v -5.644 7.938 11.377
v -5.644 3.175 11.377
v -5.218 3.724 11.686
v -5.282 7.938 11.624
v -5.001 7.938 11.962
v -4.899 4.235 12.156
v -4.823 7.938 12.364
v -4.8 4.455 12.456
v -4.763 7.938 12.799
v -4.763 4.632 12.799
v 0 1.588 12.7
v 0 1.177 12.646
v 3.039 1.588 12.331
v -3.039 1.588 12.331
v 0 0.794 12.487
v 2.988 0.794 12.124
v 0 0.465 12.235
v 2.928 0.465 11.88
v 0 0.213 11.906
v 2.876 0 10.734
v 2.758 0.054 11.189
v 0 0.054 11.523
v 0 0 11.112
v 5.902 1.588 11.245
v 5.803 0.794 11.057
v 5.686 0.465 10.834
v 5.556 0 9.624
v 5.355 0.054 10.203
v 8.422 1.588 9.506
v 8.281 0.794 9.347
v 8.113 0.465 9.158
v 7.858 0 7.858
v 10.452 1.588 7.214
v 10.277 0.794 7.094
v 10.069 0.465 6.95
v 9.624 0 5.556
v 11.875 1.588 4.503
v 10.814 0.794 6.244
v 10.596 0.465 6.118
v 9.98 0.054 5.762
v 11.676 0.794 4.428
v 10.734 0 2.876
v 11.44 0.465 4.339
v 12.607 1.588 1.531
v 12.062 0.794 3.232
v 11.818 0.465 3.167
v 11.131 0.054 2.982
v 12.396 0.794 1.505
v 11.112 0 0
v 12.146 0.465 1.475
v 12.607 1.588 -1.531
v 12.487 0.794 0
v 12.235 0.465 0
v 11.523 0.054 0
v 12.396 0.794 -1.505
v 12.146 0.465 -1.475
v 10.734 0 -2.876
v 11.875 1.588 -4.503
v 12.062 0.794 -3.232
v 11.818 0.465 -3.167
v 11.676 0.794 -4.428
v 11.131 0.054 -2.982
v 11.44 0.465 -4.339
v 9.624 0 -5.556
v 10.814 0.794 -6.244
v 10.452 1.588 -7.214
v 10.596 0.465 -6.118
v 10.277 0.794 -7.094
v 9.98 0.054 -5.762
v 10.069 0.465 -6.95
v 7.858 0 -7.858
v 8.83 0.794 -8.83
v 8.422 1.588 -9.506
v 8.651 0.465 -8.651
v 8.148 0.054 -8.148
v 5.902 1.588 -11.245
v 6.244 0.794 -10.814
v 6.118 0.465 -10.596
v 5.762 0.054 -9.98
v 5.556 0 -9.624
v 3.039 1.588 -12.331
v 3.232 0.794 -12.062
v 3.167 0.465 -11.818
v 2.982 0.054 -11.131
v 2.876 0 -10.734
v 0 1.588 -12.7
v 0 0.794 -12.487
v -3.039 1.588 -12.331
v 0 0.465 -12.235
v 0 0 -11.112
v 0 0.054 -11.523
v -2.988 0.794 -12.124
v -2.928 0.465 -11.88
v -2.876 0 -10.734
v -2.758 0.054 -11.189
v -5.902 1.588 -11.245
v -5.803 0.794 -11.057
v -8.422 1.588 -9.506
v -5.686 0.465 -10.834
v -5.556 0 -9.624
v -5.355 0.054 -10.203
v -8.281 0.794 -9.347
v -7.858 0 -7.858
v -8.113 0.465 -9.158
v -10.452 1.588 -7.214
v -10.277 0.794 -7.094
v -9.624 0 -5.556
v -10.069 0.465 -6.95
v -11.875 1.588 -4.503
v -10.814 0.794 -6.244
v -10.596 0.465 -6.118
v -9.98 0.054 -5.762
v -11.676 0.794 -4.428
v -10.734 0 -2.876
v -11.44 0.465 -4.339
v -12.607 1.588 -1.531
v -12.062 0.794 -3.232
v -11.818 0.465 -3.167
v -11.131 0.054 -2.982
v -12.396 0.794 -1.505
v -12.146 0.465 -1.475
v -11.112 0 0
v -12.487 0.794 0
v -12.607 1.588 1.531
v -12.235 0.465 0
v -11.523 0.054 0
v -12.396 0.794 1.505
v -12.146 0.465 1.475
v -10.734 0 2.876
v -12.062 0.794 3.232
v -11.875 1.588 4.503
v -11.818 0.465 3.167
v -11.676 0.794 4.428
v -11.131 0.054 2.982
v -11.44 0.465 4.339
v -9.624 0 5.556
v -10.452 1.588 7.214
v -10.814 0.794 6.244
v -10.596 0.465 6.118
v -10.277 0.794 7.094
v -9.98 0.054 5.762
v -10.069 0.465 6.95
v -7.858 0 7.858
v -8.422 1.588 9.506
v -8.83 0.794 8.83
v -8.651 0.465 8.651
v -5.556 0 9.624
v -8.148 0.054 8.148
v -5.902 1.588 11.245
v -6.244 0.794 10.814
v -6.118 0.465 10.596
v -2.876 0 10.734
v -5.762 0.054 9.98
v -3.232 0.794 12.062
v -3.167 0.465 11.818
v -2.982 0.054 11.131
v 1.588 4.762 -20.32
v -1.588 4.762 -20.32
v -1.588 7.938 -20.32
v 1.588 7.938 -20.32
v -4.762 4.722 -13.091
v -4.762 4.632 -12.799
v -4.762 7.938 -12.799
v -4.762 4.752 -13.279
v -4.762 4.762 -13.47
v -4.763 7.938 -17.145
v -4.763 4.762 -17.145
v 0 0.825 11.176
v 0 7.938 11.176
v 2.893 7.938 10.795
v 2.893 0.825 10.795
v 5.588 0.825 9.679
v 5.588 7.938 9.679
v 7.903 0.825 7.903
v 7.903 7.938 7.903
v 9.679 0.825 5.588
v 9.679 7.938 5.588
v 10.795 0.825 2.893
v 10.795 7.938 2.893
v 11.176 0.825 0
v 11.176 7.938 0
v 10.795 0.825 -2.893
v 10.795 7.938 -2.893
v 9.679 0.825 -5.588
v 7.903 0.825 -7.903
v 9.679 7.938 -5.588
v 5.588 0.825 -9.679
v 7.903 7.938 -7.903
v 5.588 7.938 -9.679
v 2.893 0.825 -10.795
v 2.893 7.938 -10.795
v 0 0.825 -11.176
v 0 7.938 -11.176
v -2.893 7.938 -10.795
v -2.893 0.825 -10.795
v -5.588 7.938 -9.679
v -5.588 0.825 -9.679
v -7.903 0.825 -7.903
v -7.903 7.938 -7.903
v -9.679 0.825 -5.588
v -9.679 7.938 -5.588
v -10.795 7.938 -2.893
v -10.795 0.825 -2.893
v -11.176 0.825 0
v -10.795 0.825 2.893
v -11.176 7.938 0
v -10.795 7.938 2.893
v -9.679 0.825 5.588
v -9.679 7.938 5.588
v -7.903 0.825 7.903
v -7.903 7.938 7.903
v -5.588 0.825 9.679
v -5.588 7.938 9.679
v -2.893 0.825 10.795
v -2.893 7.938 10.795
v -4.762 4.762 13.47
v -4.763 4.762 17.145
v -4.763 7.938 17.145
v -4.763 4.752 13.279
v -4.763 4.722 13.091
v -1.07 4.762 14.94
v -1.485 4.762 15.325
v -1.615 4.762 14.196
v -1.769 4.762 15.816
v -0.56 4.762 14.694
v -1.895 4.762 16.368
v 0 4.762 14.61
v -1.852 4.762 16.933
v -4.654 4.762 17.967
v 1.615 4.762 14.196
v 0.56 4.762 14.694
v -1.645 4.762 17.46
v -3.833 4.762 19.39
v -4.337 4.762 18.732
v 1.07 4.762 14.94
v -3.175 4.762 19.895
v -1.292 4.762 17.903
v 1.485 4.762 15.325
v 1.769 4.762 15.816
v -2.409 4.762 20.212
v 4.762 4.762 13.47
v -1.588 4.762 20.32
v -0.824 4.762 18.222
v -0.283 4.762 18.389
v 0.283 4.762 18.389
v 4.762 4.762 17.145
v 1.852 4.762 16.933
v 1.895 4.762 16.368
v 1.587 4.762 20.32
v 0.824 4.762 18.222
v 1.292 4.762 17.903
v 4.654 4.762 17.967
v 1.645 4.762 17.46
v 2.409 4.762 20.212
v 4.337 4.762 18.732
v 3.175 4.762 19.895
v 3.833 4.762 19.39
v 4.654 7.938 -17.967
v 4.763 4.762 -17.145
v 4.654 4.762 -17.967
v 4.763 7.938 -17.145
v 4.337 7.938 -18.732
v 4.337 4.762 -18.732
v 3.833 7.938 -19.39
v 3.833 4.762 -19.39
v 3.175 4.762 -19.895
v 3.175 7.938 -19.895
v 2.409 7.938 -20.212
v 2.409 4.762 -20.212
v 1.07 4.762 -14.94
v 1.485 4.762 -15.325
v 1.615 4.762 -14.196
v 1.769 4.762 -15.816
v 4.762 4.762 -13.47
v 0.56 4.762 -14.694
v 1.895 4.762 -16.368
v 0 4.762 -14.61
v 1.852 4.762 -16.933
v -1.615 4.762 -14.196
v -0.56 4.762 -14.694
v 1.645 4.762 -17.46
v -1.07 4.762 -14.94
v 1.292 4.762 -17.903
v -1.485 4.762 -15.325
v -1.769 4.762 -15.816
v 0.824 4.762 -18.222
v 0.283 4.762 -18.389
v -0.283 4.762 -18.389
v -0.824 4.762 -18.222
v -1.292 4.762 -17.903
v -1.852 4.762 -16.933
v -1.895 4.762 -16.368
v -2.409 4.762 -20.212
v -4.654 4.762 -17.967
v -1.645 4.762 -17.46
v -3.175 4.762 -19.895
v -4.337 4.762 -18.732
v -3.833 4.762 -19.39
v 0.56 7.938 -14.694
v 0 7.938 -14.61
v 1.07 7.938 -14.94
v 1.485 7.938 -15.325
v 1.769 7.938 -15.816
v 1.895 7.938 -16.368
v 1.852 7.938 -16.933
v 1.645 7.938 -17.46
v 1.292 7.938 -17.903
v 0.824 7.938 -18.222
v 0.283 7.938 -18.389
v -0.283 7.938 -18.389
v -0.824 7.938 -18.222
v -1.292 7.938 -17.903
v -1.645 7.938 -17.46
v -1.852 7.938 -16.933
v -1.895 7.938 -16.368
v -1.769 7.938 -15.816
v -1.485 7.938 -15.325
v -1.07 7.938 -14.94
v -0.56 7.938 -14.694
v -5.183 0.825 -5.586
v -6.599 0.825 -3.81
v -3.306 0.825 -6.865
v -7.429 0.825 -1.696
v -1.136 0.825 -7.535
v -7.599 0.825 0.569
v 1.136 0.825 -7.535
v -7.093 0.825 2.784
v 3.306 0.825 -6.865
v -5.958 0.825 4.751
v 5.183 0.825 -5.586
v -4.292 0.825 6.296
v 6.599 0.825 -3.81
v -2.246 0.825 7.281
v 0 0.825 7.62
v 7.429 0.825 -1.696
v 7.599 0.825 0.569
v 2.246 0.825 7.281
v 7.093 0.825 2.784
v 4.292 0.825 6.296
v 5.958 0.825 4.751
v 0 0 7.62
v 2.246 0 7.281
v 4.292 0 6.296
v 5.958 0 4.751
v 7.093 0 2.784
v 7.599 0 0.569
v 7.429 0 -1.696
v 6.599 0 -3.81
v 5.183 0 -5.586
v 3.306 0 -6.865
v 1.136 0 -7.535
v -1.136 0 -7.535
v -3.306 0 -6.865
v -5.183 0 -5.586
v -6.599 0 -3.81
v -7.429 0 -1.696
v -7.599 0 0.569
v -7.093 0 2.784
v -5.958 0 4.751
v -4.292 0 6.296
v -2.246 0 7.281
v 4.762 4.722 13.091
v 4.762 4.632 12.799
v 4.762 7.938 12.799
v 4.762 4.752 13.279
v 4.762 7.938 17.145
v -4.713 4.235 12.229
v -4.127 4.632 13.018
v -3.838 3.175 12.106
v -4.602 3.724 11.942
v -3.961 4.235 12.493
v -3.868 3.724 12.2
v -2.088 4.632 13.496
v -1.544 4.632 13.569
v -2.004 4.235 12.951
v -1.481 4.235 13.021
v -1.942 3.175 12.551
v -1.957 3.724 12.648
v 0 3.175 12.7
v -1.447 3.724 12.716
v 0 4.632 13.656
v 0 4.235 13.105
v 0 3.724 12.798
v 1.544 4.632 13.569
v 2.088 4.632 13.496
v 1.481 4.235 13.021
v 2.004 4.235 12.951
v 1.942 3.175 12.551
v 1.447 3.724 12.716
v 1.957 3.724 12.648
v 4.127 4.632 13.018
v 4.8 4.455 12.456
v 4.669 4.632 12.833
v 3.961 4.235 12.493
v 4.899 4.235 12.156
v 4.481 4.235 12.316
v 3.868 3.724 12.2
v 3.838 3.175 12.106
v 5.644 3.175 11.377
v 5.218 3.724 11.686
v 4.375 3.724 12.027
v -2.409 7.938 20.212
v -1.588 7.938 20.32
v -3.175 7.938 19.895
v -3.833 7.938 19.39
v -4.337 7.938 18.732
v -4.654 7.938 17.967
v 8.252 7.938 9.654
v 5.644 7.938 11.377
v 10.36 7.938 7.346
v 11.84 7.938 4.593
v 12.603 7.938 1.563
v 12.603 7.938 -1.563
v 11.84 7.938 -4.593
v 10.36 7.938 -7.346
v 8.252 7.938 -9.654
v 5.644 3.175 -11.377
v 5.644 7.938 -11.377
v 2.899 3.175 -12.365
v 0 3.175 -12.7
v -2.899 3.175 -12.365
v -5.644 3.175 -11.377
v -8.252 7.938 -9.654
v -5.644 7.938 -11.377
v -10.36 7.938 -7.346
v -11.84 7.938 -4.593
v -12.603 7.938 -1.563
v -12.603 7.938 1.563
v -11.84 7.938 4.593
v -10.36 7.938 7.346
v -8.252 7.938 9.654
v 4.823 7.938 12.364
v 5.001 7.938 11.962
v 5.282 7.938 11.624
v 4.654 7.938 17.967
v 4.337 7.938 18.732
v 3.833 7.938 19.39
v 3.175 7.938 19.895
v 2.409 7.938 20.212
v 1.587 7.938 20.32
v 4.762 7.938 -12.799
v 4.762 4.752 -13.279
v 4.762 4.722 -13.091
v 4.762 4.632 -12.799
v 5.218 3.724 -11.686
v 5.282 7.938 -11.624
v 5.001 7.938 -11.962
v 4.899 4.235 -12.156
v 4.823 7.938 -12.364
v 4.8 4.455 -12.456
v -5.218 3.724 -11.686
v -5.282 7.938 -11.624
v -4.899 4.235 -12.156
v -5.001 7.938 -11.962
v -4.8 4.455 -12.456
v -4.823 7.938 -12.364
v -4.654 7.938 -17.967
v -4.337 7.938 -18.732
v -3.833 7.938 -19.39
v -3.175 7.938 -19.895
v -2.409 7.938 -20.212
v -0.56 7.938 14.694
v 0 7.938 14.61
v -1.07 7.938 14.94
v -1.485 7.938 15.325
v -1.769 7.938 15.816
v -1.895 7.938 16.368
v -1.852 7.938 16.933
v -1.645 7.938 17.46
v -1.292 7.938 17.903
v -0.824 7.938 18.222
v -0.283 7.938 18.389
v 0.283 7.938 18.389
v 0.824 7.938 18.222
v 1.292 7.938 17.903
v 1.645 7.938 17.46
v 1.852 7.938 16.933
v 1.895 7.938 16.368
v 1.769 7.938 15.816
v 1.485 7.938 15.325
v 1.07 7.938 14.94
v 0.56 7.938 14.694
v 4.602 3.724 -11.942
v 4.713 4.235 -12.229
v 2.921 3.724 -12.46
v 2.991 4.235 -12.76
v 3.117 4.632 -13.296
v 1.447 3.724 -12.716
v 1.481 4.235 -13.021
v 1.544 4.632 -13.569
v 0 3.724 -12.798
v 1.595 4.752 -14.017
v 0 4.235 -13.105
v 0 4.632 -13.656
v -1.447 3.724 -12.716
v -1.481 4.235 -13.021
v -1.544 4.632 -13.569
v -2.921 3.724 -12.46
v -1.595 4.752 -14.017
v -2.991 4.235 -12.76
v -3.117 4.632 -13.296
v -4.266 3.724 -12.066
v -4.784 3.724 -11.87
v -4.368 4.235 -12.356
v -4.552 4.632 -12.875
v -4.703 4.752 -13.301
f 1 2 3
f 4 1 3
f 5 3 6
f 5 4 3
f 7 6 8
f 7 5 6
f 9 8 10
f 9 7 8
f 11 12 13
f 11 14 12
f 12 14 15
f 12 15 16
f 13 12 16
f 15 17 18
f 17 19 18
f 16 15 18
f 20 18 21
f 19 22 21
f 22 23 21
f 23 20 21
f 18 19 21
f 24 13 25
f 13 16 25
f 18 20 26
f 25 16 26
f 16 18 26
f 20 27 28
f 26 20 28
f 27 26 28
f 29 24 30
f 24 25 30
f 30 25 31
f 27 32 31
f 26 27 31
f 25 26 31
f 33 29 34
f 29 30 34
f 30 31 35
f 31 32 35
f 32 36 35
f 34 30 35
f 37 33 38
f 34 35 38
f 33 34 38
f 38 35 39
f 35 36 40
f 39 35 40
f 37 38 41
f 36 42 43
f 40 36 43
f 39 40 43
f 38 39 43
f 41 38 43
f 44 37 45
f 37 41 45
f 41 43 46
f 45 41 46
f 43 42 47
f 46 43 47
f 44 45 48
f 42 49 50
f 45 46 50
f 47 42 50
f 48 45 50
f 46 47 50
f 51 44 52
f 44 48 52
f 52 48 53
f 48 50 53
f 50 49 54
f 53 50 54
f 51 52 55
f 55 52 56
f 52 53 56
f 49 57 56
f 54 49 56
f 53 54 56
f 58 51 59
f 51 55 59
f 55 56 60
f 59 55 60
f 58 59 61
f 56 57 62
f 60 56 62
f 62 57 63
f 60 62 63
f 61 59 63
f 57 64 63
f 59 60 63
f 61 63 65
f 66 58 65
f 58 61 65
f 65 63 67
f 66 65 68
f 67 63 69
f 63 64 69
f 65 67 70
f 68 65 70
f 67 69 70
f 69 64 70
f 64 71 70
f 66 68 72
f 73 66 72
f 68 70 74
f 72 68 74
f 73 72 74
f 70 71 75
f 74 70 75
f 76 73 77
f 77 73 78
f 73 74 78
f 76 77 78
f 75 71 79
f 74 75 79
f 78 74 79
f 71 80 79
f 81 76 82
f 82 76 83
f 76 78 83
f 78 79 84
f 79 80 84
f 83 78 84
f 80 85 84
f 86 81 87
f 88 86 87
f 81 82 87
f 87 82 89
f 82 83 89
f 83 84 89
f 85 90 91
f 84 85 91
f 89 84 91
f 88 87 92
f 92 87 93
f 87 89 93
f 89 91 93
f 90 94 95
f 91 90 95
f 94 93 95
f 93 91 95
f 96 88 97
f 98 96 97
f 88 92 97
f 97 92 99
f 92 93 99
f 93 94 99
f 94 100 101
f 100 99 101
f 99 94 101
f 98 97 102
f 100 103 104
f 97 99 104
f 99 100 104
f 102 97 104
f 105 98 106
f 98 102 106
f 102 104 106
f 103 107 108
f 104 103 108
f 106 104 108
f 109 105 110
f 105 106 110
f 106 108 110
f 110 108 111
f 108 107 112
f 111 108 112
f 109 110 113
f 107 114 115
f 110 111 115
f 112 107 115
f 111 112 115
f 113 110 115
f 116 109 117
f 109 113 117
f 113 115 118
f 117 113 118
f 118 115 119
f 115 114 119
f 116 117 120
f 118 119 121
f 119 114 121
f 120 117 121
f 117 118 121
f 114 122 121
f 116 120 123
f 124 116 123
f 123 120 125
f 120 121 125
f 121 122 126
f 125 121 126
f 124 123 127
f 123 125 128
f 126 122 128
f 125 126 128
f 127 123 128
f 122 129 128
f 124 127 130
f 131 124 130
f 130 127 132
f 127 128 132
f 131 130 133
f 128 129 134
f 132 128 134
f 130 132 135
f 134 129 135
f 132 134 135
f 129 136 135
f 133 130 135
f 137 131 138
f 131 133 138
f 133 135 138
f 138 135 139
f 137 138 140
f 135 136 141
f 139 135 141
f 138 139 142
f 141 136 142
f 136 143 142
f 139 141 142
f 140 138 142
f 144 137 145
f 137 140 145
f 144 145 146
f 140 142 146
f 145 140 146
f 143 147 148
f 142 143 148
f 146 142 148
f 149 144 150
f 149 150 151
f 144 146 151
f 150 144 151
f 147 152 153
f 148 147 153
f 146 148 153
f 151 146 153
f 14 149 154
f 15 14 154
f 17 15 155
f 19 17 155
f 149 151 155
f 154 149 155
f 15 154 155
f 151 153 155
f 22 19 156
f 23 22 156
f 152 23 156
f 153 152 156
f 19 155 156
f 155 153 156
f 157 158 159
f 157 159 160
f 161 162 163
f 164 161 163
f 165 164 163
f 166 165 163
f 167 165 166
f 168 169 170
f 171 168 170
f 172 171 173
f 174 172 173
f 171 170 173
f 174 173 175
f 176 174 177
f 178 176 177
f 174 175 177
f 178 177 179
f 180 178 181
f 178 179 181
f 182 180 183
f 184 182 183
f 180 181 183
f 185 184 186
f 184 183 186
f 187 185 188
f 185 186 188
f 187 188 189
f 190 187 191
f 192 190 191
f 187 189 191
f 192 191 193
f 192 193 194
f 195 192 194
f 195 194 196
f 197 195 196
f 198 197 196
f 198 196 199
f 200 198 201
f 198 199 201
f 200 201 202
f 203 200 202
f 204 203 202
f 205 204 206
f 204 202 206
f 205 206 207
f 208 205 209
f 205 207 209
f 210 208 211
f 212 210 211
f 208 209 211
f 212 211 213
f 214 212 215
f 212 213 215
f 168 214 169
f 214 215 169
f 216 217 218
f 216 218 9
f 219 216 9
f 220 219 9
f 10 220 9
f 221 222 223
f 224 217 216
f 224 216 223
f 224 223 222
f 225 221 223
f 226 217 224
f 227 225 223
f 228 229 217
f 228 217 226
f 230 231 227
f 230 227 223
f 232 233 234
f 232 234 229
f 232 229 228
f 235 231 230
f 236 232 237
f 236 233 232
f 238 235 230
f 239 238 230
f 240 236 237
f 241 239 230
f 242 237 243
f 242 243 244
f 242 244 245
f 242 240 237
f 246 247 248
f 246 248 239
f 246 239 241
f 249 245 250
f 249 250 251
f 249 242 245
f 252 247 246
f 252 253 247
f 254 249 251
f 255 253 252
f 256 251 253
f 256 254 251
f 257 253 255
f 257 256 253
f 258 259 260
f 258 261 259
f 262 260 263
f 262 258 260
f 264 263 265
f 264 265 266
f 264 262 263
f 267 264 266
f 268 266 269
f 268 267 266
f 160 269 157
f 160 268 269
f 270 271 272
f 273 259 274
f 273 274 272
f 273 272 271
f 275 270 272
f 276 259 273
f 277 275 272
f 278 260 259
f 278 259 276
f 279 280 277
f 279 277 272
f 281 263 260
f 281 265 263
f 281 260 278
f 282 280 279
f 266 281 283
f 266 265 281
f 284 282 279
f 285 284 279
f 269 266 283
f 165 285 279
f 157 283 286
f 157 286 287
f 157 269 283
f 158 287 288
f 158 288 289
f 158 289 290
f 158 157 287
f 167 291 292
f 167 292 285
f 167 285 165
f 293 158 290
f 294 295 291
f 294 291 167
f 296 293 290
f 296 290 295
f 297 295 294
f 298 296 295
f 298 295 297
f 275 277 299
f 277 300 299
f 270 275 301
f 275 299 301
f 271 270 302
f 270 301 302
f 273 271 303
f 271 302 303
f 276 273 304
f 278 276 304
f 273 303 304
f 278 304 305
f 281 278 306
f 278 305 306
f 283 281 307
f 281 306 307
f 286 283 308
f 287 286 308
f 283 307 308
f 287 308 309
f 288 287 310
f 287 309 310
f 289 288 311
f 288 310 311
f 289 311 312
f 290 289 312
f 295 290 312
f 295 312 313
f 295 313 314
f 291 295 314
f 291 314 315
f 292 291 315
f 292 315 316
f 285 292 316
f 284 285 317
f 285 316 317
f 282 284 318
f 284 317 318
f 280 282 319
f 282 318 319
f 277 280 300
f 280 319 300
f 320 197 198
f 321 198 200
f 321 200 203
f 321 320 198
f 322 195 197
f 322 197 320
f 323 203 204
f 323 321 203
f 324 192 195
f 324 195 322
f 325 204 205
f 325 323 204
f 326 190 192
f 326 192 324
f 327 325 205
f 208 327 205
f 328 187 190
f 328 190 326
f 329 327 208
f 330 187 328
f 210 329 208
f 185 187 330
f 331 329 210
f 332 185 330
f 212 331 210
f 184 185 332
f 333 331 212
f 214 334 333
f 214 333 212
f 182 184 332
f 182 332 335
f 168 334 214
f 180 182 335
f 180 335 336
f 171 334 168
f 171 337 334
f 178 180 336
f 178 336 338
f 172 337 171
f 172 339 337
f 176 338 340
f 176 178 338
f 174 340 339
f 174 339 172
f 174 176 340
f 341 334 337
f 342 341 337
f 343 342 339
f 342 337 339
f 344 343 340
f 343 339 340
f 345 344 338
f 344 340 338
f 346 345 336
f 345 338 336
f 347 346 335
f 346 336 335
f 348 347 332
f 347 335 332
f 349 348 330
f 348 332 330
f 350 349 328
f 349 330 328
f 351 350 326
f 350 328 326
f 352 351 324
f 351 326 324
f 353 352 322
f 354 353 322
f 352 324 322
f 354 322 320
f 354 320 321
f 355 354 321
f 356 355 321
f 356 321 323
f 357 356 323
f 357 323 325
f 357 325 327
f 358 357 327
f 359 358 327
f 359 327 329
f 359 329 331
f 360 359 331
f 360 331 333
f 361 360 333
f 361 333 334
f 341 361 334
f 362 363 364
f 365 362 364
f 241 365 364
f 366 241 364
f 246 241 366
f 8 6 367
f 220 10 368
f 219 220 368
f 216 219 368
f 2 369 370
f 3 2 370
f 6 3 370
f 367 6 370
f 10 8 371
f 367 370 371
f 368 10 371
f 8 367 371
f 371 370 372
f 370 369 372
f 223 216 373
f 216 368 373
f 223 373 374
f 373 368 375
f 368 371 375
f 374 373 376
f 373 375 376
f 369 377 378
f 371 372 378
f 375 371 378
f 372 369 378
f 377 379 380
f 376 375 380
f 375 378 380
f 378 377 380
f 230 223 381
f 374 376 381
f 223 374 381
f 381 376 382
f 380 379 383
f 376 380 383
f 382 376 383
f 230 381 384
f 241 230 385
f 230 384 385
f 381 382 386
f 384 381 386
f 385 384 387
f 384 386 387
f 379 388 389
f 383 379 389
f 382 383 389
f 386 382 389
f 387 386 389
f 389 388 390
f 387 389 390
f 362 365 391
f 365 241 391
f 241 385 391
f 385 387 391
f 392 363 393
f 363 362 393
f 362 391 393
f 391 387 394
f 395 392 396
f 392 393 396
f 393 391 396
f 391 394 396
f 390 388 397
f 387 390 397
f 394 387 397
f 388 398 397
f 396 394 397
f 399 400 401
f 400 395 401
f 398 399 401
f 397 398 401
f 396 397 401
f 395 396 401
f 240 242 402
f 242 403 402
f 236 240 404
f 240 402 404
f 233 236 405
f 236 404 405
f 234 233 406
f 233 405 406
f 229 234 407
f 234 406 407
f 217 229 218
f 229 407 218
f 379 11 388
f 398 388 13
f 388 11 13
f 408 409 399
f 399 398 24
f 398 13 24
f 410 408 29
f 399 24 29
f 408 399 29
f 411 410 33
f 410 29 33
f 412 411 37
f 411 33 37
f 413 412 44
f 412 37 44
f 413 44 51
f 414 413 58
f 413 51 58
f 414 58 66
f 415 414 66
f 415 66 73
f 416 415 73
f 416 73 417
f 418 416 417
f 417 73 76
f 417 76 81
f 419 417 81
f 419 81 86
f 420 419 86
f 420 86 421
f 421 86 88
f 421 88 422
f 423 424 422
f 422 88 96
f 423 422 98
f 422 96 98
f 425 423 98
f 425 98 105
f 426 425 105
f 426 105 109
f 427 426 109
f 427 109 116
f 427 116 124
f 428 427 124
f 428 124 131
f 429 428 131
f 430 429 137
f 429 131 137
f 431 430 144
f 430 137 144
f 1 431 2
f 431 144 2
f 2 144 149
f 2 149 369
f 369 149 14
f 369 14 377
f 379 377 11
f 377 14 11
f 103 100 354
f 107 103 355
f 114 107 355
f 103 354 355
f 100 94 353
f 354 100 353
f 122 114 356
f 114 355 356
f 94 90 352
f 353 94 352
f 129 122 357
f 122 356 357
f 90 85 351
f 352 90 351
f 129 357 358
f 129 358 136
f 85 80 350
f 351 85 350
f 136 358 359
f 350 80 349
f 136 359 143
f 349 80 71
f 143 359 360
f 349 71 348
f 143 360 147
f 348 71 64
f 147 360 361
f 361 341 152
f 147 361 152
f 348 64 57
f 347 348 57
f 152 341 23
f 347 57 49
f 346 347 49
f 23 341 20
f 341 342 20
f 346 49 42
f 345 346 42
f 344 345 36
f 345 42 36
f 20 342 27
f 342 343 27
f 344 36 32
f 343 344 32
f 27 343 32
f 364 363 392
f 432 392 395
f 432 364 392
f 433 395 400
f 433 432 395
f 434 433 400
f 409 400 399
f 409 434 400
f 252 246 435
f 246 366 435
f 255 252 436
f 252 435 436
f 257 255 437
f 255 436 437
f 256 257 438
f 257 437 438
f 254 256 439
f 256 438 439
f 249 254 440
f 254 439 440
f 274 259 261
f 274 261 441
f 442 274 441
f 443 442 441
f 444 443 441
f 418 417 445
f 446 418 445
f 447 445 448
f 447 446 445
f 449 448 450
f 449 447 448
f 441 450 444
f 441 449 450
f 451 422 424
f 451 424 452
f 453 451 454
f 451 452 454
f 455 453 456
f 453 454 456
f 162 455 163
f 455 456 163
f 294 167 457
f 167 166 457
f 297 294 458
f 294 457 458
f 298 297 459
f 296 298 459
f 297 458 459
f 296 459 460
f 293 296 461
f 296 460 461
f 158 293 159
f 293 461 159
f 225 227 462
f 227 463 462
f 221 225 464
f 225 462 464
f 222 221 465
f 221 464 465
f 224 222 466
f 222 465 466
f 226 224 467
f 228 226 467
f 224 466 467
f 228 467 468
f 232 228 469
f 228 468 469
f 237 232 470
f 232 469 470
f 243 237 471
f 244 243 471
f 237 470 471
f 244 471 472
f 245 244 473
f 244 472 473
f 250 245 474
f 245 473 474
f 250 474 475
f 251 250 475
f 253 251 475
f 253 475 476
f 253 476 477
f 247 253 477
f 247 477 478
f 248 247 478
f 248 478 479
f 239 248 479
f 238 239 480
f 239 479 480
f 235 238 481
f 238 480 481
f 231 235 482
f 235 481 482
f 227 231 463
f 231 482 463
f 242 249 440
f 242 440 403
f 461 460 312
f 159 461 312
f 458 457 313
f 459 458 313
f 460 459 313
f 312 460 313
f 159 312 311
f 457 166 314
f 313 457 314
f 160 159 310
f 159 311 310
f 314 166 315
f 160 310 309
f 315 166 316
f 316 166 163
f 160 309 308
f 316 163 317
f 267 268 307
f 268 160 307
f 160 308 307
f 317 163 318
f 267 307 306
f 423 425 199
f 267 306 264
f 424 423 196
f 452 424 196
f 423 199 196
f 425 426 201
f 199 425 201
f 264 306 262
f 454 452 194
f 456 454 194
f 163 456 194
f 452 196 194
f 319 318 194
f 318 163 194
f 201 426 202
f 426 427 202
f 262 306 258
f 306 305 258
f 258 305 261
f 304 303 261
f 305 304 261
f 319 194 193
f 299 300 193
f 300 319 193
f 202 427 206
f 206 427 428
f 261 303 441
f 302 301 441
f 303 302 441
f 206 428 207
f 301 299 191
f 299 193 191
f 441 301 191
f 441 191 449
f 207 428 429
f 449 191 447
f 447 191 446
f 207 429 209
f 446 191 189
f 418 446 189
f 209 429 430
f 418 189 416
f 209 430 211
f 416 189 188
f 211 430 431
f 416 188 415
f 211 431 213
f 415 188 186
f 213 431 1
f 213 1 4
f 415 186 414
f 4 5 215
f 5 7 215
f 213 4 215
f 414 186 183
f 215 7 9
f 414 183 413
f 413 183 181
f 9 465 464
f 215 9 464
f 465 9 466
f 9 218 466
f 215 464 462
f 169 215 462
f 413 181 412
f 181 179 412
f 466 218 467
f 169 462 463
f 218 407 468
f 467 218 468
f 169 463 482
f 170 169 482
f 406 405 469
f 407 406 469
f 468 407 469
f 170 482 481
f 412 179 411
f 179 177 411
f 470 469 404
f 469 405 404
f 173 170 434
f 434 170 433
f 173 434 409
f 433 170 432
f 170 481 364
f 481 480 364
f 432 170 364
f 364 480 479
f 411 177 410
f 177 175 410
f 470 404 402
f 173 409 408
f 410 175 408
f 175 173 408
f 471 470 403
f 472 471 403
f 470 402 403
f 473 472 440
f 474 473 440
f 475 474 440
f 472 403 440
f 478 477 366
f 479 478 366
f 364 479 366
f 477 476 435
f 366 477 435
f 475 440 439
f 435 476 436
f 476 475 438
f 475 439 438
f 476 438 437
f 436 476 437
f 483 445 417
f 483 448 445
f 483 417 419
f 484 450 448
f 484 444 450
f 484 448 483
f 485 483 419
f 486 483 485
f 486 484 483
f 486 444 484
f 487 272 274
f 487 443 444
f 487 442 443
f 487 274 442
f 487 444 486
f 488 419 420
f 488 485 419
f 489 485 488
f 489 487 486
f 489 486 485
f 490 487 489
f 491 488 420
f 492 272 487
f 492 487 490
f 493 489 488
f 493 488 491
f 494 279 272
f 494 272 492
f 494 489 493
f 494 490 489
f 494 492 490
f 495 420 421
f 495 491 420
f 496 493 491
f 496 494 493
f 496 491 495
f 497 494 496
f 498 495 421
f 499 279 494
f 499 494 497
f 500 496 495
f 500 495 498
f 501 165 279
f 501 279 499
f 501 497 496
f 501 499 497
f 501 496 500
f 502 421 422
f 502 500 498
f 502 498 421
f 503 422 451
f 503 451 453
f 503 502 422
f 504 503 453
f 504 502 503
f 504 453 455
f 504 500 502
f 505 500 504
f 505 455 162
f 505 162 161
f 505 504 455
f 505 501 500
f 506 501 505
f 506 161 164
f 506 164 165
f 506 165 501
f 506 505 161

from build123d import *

# Parameters (mm, degrees)
SKETCH1_R                = 12.7
BOSS_EXTRUDE1_DEPTH      = 7.9375
SKETCH3_R                = 7.62
CUT_EXTRUDE2_DEPTH       = 20.636290542
SKETCH4_R                = 11.176
CUT_EXTRUDE3_DEPTH       = 7.112
BOSS_EXTRUDE2_START      = -3.175
BOSS_EXTRUDE2_DEPTH      = 3.175
SKETCH6_R                = 1.9
CUT_EXTRUDE4_DEPTH       = 26.242747597
FILLET1_R                = 3.175
CIRPATTERN1_COUNT        = 2
FILLET1_OF_CIRPATTERN1_R = 3.175
FILLET2_R                = 1.5875


with BuildPart() as part:
    # Sketch1 → Boss-Extrude1 (new body)
    with BuildSketch(Plane(origin=(0, 0, 0), x_dir=(1, 0, 0), z_dir=(0, 1, 0))):
        with Locations(Location((0, 0, 0), (0, 0, 270))):
            Circle(SKETCH1_R)
    extrude(amount=BOSS_EXTRUDE1_DEPTH)

    # Sketch3 → Cut-Extrude2 (cut, through all)
    with BuildSketch(Plane(origin=(0, 7.9375, 0), x_dir=(1, 0, 0), z_dir=(0, 1, 0))):
        with Locations(Location((0, 0, 0), (0, 0, 270))):
            Circle(SKETCH3_R)
    extrude(amount=-CUT_EXTRUDE2_DEPTH, mode=Mode.SUBTRACT)

    # Sketch4 → Cut-Extrude3 (cut)
    with BuildSketch(Plane(origin=(0, 7.9375, 0), x_dir=(1, 0, 0), z_dir=(0, 1, 0))):
        with Locations(Location((0, 0, 0), (0, 0, 270))):
            Circle(SKETCH4_R)
    extrude(amount=-CUT_EXTRUDE3_DEPTH, mode=Mode.SUBTRACT)

    # Sketch5 → Boss-Extrude2 (add)
    with BuildSketch(Plane(origin=(0, 7.9375, 0), x_dir=(1, 0, 0), z_dir=(0, 1, 0)).offset(BOSS_EXTRUDE2_START)):
        with BuildLine():
            Line((-4.7625, 11.773215098), (-4.7625, 20.32))
            Line((-4.7625, 20.32), (4.7625, 20.32))
            Line((4.7625, 20.32), (4.7625, 11.773215098))
            ThreePointArc((4.7625, 11.773215098), (0, 12.7), (-4.7625, 11.773215098))
        make_face()
    boss_extrude2 = extrude(amount=BOSS_EXTRUDE2_DEPTH)

    # Sketch6 → Cut-Extrude4 (cut, symmetric)
    with BuildSketch(Plane(origin=(0, 7.9375, 0), x_dir=(1, 0, 0), z_dir=(0, 1, 0))):
        with Locations(Location((0, 16.51, 0), (0, 0, 270))):
            Circle(SKETCH6_R)
    cut_extrude4 = extrude(amount=CUT_EXTRUDE4_DEPTH, both=True, mode=Mode.SUBTRACT)

    # Fillet1
    fillet1_edges = [part.edges().sort_by_distance(p)[0] for p in [
        (-4.7625, 6.35, -20.32),
        (4.7625, 6.35, -20.32),
    ]]
    fillet(fillet1_edges, radius=FILLET1_R)

    # CirPattern1: Boss-Extrude2, Cut-Extrude4 ×2 about axis
    cirpattern1_axis = Axis((0, 0, 0), (0, 1, 0))
    add([boss_extrude2.rotate(cirpattern1_axis, i * 360 / CIRPATTERN1_COUNT) for i in range(1, CIRPATTERN1_COUNT)])
    add([cut_extrude4.rotate(cirpattern1_axis, i * 360 / CIRPATTERN1_COUNT) for i in range(1, CIRPATTERN1_COUNT)], mode=Mode.SUBTRACT)

    # Fillet1 of CirPattern1
    fillet1_of_cirpattern1_edges = [part.edges().sort_by_distance(p)[0] for p in [
        (4.7625, 6.35, 20.32),
        (-4.7625, 6.35, 20.32),
    ]]
    fillet(fillet1_of_cirpattern1_edges, radius=FILLET1_OF_CIRPATTERN1_R)

    # Fillet2
    fillet2_edges = [part.edges().sort_by_distance(p)[0] for p in [
        (0, 4.7625, -12.7),
        (4.7625, 6.35, -11.773215098),
        (-4.7625, 6.35, -11.773215098),
        (0, 0, -12.7),
        (-2.425919233, 4.7625, 12.466150804),
        (-4.7625, 6.35, 11.773215098),
        (4.7625, 6.35, 11.773215098),
    ]]
    fillet(fillet2_edges, radius=FILLET2_R)


solid = part.part
